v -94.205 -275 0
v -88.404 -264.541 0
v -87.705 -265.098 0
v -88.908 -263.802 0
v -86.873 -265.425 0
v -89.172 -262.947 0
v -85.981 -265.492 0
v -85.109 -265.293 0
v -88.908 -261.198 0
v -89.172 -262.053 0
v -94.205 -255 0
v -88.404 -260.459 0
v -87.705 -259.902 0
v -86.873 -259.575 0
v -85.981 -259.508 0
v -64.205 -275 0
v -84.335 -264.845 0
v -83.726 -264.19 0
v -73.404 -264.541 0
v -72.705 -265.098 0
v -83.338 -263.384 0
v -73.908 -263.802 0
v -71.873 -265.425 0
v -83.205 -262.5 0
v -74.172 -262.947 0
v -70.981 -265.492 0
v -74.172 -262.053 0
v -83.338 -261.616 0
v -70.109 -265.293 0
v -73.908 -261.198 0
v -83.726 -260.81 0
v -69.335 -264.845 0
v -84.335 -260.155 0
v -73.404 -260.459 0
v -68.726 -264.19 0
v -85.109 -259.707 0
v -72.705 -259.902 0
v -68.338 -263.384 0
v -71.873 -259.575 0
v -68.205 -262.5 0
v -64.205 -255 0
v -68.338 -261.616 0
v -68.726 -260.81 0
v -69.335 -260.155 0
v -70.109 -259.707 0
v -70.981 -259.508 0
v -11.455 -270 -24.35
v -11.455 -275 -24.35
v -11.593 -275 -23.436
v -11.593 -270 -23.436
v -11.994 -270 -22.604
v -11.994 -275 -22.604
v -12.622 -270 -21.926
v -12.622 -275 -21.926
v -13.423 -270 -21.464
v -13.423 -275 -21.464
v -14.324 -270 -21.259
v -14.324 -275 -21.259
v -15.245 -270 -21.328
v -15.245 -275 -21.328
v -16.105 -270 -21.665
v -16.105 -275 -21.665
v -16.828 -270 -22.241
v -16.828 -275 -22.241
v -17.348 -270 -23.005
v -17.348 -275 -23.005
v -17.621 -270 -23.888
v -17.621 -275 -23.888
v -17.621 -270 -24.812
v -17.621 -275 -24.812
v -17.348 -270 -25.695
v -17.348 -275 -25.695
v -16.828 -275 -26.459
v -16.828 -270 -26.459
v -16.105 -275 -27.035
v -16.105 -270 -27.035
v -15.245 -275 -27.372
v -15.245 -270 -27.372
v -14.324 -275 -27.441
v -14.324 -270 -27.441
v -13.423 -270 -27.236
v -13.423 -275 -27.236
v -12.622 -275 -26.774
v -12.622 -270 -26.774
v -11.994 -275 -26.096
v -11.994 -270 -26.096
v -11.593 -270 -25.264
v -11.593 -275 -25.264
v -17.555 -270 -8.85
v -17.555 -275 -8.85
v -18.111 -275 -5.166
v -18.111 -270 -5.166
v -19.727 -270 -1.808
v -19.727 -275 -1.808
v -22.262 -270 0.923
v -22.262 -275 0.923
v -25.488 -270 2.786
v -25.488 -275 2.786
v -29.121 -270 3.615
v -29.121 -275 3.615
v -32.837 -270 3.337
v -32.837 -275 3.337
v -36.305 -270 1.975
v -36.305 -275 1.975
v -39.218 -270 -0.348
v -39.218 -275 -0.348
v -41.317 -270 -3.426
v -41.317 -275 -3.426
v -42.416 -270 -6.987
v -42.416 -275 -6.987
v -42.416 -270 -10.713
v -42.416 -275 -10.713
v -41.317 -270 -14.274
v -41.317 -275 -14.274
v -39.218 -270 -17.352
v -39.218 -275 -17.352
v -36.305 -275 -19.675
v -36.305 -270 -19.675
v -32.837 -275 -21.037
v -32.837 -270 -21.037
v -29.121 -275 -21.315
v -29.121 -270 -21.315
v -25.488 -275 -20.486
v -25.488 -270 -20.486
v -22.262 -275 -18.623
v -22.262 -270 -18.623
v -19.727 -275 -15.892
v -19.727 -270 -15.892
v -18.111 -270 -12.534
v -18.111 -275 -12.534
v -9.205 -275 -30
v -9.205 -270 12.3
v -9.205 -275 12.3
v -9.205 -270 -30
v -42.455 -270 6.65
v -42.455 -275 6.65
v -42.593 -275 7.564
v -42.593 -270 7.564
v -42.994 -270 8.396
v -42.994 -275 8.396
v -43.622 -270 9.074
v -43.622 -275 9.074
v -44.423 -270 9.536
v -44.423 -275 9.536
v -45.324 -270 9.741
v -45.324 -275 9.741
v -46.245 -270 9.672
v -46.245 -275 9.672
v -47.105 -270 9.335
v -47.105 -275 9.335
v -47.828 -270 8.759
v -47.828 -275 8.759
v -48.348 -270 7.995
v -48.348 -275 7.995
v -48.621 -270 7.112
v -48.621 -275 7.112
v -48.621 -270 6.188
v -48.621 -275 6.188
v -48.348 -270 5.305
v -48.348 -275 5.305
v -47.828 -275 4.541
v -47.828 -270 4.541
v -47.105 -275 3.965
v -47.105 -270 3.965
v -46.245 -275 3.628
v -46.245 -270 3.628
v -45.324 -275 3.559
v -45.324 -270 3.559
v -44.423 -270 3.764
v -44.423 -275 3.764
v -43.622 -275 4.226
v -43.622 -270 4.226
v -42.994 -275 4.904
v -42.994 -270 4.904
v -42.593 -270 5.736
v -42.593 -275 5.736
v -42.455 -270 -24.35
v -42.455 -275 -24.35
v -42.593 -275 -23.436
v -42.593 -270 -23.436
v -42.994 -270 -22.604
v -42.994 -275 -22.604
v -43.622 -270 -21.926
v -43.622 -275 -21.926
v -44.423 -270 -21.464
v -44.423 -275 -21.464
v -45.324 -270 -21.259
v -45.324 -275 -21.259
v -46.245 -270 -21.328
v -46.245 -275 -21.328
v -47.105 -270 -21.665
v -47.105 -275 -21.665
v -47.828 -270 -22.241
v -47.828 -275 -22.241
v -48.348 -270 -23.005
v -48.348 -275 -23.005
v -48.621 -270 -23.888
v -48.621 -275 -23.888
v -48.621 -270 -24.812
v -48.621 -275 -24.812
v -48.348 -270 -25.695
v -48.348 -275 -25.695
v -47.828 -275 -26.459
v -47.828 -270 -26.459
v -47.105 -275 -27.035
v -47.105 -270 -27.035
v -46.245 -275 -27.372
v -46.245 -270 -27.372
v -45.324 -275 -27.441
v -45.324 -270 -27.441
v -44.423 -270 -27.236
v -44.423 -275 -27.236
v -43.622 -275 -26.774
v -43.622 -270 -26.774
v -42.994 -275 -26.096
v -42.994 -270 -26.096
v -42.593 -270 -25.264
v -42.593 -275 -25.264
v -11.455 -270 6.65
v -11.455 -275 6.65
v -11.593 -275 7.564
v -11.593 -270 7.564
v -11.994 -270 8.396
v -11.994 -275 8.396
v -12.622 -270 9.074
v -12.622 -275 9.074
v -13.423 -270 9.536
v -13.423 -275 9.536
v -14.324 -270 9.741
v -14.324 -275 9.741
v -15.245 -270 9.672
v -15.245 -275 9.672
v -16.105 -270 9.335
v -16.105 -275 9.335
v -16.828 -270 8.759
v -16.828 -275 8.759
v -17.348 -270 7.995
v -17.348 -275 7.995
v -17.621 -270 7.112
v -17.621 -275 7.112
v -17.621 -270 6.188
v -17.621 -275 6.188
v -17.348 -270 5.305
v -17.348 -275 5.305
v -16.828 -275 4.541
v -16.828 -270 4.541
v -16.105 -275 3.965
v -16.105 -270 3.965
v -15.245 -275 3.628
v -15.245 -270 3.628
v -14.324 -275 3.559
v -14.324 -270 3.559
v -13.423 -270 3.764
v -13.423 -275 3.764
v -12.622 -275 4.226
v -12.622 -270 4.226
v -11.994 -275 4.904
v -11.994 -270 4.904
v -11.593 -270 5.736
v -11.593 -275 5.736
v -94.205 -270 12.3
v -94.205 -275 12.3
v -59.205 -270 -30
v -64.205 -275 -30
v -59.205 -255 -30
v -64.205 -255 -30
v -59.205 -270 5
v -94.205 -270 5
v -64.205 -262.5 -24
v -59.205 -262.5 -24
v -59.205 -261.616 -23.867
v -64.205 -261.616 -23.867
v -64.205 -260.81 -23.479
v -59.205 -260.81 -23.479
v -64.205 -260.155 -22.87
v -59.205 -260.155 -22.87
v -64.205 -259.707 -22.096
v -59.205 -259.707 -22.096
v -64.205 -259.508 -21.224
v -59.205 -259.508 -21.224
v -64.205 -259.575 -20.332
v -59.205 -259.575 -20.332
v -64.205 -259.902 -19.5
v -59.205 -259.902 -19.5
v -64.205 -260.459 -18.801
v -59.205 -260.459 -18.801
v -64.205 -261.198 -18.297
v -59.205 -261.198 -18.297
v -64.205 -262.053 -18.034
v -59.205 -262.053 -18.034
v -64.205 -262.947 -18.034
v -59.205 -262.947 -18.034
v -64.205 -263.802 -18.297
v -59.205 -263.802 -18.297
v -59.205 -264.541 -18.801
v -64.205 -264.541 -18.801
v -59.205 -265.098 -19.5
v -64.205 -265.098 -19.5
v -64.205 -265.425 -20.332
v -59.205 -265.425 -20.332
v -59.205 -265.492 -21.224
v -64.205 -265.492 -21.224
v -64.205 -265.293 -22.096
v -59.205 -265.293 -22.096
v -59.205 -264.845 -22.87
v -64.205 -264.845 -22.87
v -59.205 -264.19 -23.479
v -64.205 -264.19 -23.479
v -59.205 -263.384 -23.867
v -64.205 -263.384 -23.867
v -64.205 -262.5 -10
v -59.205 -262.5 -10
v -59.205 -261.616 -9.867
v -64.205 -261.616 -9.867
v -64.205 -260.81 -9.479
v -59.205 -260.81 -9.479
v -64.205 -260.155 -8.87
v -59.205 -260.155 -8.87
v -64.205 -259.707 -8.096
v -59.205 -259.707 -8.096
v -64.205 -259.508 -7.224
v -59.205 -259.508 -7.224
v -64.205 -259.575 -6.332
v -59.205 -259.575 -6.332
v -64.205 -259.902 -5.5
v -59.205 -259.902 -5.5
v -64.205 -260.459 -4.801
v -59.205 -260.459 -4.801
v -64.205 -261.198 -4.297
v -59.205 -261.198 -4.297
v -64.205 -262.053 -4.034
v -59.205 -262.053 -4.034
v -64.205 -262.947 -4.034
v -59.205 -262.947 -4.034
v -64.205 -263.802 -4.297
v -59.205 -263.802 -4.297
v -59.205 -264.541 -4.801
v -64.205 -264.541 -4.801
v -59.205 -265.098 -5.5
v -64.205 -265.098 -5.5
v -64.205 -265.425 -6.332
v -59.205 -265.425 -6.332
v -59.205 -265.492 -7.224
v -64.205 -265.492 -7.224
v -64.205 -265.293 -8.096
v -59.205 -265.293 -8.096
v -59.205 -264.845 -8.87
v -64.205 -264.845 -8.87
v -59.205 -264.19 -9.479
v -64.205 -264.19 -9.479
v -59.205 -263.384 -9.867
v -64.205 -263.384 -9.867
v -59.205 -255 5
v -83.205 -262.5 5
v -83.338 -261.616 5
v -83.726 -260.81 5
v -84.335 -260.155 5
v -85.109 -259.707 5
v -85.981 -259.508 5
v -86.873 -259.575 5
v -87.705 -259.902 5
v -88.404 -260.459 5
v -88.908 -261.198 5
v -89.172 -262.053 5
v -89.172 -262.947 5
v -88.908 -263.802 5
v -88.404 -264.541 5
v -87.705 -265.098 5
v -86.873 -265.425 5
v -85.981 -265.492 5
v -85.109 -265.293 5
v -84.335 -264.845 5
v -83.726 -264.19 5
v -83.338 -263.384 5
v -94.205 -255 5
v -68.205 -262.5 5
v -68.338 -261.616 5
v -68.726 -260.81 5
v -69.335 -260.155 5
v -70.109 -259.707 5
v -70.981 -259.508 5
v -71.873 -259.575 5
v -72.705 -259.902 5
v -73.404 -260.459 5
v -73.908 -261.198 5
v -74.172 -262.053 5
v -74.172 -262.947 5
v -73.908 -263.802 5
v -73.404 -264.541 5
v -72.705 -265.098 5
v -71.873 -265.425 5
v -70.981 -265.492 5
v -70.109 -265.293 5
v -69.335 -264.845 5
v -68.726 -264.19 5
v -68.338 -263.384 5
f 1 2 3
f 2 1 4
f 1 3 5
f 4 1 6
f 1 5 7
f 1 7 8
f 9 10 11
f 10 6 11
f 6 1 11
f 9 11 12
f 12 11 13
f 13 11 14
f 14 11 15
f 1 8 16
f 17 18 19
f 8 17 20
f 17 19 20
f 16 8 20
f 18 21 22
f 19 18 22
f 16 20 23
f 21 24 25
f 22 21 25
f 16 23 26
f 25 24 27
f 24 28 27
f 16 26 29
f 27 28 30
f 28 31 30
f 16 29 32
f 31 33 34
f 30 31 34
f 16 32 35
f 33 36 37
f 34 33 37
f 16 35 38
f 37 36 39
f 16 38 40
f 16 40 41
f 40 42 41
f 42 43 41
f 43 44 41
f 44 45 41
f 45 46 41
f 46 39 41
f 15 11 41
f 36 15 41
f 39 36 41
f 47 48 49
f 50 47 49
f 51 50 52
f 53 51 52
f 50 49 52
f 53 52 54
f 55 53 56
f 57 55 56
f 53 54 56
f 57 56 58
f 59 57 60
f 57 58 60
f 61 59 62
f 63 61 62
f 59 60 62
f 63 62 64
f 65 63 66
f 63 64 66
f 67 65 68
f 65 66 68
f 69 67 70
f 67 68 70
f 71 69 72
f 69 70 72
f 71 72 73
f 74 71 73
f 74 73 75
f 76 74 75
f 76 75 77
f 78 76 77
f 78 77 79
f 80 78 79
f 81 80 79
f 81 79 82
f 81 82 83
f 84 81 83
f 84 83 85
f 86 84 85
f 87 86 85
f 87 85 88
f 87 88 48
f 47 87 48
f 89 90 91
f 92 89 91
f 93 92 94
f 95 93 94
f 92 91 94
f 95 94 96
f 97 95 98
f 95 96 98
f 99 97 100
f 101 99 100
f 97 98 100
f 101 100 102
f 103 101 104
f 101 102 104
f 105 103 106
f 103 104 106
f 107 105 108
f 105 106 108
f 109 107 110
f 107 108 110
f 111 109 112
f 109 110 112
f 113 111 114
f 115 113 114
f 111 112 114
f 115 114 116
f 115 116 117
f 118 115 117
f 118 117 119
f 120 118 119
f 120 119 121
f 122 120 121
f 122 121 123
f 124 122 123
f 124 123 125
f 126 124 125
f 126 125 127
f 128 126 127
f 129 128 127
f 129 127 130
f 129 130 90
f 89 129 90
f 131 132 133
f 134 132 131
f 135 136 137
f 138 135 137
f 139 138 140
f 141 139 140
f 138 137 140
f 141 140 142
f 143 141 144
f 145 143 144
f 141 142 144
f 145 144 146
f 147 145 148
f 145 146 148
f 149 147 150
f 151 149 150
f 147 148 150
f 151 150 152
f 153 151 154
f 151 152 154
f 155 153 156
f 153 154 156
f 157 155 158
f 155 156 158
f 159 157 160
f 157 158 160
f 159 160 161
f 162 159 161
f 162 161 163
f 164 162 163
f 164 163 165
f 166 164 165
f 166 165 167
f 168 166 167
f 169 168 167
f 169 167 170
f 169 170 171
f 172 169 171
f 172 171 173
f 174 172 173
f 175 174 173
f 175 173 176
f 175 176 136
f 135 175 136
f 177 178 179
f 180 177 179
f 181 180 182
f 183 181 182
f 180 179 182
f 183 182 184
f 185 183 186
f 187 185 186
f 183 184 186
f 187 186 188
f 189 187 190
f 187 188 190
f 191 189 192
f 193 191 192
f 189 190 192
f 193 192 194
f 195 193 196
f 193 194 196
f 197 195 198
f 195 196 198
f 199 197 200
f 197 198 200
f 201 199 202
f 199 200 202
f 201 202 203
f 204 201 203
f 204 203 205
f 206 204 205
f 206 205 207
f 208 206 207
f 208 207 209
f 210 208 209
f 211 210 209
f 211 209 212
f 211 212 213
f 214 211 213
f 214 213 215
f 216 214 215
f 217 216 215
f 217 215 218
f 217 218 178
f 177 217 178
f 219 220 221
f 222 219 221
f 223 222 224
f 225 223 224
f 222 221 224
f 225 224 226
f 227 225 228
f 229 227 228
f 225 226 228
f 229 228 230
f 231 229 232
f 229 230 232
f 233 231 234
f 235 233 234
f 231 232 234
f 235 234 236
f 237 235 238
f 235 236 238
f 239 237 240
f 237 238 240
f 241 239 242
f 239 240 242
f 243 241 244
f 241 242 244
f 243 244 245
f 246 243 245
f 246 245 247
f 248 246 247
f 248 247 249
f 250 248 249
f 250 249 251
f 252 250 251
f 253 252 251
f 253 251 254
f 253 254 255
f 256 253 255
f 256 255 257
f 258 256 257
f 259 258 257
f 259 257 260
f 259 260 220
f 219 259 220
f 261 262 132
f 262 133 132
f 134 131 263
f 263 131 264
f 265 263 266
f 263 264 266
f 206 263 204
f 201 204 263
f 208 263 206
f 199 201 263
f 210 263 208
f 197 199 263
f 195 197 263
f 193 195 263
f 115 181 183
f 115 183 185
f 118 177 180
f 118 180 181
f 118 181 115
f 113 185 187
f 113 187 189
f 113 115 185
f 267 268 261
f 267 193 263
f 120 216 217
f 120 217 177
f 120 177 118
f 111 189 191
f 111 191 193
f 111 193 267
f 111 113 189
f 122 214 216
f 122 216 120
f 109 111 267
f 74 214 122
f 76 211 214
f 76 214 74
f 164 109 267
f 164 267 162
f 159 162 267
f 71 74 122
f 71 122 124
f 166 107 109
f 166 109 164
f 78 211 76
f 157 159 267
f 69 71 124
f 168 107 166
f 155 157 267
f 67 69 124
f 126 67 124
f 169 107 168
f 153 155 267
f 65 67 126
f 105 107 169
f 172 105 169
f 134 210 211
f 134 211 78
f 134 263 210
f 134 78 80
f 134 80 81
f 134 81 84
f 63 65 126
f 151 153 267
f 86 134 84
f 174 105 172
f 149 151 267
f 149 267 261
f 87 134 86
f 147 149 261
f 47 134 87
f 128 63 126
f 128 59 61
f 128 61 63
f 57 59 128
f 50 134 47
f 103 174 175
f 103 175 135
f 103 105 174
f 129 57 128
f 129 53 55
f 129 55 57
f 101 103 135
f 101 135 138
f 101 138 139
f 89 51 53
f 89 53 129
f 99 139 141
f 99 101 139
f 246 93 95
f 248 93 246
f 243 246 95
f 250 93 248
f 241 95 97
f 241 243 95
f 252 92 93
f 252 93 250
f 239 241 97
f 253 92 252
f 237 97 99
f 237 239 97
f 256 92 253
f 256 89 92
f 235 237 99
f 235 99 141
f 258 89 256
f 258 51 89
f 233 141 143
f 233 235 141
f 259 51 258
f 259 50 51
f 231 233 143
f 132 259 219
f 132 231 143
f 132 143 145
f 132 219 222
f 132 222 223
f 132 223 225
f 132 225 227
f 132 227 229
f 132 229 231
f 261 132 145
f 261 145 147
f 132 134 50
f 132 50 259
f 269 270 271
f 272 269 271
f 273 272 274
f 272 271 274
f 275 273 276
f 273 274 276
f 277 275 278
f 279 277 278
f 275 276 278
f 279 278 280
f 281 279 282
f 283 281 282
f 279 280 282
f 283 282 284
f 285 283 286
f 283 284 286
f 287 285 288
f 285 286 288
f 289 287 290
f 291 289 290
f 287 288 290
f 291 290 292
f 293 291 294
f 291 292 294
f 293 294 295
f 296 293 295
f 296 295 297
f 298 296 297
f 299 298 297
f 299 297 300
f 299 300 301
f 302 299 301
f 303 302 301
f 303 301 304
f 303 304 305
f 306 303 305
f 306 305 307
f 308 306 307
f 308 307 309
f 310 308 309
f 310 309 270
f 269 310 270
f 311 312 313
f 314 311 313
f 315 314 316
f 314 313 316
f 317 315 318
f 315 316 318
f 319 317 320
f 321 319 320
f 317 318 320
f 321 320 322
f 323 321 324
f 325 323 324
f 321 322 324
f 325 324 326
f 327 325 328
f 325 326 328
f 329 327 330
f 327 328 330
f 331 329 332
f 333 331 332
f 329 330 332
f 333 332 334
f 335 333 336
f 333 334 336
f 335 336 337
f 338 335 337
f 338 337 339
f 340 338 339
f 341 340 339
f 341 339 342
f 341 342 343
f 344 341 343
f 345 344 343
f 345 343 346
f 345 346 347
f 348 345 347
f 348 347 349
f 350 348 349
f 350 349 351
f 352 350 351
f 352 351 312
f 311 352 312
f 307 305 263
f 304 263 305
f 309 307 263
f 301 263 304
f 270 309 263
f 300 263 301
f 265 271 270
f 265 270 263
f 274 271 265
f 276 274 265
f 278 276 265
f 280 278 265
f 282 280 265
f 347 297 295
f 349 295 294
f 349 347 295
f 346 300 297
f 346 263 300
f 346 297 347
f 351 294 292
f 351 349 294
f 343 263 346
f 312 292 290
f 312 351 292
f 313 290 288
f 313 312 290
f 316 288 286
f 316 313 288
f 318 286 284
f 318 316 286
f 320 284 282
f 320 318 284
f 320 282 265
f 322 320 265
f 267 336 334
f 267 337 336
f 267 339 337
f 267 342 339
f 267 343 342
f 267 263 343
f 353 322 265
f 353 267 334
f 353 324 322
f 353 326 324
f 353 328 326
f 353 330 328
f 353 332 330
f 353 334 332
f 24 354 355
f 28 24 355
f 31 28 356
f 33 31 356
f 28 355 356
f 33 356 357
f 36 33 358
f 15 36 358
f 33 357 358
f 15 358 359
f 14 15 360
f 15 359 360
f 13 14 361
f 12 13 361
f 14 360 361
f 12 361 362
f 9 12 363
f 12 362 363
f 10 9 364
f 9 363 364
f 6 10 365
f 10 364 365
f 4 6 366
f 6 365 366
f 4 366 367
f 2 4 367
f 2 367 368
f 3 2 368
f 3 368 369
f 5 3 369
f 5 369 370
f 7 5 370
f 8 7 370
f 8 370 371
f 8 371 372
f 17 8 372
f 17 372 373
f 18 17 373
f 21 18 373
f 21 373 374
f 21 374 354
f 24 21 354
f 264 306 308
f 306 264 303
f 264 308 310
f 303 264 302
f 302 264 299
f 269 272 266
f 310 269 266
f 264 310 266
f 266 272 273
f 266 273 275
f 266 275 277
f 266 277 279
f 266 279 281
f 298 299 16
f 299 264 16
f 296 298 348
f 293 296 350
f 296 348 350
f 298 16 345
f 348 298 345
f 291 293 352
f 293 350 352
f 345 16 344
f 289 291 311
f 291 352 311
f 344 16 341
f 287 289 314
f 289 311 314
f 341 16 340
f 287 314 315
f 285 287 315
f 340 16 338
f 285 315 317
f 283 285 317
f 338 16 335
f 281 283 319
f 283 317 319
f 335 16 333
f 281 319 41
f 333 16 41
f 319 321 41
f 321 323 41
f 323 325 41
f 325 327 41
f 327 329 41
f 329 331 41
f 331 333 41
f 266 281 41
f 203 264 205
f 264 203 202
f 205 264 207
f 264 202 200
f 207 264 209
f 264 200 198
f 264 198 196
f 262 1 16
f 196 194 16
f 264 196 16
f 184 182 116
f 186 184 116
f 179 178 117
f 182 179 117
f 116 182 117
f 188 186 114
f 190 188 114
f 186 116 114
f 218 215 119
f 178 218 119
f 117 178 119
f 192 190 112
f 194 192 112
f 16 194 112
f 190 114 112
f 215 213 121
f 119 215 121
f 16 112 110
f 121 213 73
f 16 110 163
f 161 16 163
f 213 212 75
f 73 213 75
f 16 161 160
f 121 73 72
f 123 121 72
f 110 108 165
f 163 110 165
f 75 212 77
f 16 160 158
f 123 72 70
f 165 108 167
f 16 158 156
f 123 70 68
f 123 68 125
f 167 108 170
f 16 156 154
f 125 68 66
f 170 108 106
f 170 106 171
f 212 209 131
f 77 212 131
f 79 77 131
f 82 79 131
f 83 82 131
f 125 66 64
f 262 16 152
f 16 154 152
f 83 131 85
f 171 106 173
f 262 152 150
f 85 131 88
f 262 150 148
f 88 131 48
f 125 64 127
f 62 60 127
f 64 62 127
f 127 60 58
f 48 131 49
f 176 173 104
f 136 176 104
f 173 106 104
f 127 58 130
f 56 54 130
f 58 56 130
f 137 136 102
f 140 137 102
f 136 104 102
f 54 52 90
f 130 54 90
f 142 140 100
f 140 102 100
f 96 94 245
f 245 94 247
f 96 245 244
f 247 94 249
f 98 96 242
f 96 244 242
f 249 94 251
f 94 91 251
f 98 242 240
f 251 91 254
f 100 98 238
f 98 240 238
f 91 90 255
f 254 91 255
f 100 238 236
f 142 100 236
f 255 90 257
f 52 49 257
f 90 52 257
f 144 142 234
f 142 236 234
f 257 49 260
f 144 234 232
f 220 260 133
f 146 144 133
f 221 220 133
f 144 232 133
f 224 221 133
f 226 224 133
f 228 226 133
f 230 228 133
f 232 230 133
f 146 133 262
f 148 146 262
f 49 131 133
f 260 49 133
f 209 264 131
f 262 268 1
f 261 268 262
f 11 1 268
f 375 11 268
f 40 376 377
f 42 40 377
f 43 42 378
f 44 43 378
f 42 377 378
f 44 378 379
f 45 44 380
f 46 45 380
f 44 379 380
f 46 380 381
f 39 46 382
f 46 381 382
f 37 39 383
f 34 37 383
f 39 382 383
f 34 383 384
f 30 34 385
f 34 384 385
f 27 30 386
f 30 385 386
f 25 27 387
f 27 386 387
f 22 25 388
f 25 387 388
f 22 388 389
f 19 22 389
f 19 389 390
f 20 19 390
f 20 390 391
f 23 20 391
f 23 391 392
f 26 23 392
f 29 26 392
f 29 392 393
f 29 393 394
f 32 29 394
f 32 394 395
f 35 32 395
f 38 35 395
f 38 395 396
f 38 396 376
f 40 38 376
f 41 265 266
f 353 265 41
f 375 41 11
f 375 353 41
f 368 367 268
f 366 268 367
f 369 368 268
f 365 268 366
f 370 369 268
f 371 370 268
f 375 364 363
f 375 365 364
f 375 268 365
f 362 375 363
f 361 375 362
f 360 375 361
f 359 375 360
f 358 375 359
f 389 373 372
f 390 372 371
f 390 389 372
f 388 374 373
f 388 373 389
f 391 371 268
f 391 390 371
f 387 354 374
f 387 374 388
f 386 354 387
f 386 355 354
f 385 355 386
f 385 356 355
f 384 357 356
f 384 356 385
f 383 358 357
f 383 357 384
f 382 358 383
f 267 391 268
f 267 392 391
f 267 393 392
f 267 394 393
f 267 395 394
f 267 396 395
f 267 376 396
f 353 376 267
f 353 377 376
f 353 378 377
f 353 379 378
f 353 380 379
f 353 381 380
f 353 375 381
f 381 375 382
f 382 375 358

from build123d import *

# Parameters (mm, degrees)
ESBO_O1_W                = 35
ESBO_O1_H                = 20
RESSALTO_EXTRUS_O1_DEPTH = 5
ESBO_O2_W                = 5
ESBO_O2_H                = 20
RESSALTO_EXTRUS_O2_DEPTH = 30
ESBO_O4_W                = 42.3
ESBO_O4_H                = 5
RESSALTO_EXTRUS_O3_DEPTH = 50
ESBO_O5_W                = 7.3
ESBO_O5_H                = 5
RESSALTO_EXTRUS_O4_DEPTH = 35
ESBO_O6_R                = 3.1
ESBO_O6_R_2              = 12.5
CORTE_EXTRUS_O1_DEPTH    = 39
ESBO_O7_R                = 3
CORTE_EXTRUS_O2_DEPTH    = 36
ESBO_O8_R                = 3
CORTE_EXTRUS_O3_DEPTH    = 10


with BuildPart() as part:
    # Esboço1 → Ressalto-extrusão1 (new body)
    with BuildSketch(Plane.XY):
        with Locations((-76.705213928, -265)):
            Rectangle(ESBO_O1_W, ESBO_O1_H)
    extrude(amount=RESSALTO_EXTRUS_O1_DEPTH)

    # Esboço2 → Ressalto-extrusão2 (add)
    with BuildSketch(Plane(origin=(0, 0, 0), x_dir=(-1, 0, 0), z_dir=(0, 0, -1))):
        with Locations((61.705213928, -265)):
            Rectangle(ESBO_O2_W, ESBO_O2_H)
    extrude(amount=RESSALTO_EXTRUS_O2_DEPTH)

    # Esboço4 → Ressalto-extrusão3 (add)
    with BuildSketch(Plane(origin=(-59.205213928, 0, 0), x_dir=(0, 0, -1), z_dir=(1, 0, 0))):
        with Locations((8.85, -272.5)):
            Rectangle(ESBO_O4_W, ESBO_O4_H)
    extrude(amount=RESSALTO_EXTRUS_O3_DEPTH)

    # Esboço5 → Ressalto-extrusão4 (add)
    with BuildSketch(Plane.ZY.offset(59.205213928)):
        with Locations((8.65, -272.5)):
            Rectangle(ESBO_O5_W, ESBO_O5_H)
    extrude(amount=RESSALTO_EXTRUS_O4_DEPTH)

    # Esboço6 → Corte-extrusão1 (cut)
    with BuildSketch(Plane.XZ.offset(275)):
        with Locations((-14.555213928, 6.65)):
            Circle(ESBO_O6_R)
        with Locations((-45.555213928, -24.35)):
            Circle(ESBO_O6_R)
        with Locations((-30.055213928, -8.85)):
            Circle(ESBO_O6_R_2)
        with Locations((-45.555213928, 6.65)):
            Circle(ESBO_O6_R)
        with Locations((-14.555213928, -24.35)):
            Circle(ESBO_O6_R)
    extrude(amount=-CORTE_EXTRUS_O1_DEPTH, mode=Mode.SUBTRACT)

    # Esboço7 → Corte-extrusão2 (cut, through all)
    with BuildSketch(Plane(origin=(-59.205213928, 0, 0), x_dir=(0, 0, -1), z_dir=(1, 0, 0))):
        with Locations((21, -262.5)):
            Circle(ESBO_O7_R)
        with Locations((7, -262.5)):
            Circle(ESBO_O7_R)
    extrude(amount=-CORTE_EXTRUS_O2_DEPTH, mode=Mode.SUBTRACT)

    # Esboço8 → Corte-extrusão3 (cut)
    with BuildSketch(Plane.XY.offset(5)):
        with Locations((-71.205213928, -262.5)):
            Circle(ESBO_O8_R)
        with Locations((-86.205213928, -262.5)):
            Circle(ESBO_O8_R)
    extrude(amount=-CORTE_EXTRUS_O3_DEPTH, mode=Mode.SUBTRACT)


solid = part.part
